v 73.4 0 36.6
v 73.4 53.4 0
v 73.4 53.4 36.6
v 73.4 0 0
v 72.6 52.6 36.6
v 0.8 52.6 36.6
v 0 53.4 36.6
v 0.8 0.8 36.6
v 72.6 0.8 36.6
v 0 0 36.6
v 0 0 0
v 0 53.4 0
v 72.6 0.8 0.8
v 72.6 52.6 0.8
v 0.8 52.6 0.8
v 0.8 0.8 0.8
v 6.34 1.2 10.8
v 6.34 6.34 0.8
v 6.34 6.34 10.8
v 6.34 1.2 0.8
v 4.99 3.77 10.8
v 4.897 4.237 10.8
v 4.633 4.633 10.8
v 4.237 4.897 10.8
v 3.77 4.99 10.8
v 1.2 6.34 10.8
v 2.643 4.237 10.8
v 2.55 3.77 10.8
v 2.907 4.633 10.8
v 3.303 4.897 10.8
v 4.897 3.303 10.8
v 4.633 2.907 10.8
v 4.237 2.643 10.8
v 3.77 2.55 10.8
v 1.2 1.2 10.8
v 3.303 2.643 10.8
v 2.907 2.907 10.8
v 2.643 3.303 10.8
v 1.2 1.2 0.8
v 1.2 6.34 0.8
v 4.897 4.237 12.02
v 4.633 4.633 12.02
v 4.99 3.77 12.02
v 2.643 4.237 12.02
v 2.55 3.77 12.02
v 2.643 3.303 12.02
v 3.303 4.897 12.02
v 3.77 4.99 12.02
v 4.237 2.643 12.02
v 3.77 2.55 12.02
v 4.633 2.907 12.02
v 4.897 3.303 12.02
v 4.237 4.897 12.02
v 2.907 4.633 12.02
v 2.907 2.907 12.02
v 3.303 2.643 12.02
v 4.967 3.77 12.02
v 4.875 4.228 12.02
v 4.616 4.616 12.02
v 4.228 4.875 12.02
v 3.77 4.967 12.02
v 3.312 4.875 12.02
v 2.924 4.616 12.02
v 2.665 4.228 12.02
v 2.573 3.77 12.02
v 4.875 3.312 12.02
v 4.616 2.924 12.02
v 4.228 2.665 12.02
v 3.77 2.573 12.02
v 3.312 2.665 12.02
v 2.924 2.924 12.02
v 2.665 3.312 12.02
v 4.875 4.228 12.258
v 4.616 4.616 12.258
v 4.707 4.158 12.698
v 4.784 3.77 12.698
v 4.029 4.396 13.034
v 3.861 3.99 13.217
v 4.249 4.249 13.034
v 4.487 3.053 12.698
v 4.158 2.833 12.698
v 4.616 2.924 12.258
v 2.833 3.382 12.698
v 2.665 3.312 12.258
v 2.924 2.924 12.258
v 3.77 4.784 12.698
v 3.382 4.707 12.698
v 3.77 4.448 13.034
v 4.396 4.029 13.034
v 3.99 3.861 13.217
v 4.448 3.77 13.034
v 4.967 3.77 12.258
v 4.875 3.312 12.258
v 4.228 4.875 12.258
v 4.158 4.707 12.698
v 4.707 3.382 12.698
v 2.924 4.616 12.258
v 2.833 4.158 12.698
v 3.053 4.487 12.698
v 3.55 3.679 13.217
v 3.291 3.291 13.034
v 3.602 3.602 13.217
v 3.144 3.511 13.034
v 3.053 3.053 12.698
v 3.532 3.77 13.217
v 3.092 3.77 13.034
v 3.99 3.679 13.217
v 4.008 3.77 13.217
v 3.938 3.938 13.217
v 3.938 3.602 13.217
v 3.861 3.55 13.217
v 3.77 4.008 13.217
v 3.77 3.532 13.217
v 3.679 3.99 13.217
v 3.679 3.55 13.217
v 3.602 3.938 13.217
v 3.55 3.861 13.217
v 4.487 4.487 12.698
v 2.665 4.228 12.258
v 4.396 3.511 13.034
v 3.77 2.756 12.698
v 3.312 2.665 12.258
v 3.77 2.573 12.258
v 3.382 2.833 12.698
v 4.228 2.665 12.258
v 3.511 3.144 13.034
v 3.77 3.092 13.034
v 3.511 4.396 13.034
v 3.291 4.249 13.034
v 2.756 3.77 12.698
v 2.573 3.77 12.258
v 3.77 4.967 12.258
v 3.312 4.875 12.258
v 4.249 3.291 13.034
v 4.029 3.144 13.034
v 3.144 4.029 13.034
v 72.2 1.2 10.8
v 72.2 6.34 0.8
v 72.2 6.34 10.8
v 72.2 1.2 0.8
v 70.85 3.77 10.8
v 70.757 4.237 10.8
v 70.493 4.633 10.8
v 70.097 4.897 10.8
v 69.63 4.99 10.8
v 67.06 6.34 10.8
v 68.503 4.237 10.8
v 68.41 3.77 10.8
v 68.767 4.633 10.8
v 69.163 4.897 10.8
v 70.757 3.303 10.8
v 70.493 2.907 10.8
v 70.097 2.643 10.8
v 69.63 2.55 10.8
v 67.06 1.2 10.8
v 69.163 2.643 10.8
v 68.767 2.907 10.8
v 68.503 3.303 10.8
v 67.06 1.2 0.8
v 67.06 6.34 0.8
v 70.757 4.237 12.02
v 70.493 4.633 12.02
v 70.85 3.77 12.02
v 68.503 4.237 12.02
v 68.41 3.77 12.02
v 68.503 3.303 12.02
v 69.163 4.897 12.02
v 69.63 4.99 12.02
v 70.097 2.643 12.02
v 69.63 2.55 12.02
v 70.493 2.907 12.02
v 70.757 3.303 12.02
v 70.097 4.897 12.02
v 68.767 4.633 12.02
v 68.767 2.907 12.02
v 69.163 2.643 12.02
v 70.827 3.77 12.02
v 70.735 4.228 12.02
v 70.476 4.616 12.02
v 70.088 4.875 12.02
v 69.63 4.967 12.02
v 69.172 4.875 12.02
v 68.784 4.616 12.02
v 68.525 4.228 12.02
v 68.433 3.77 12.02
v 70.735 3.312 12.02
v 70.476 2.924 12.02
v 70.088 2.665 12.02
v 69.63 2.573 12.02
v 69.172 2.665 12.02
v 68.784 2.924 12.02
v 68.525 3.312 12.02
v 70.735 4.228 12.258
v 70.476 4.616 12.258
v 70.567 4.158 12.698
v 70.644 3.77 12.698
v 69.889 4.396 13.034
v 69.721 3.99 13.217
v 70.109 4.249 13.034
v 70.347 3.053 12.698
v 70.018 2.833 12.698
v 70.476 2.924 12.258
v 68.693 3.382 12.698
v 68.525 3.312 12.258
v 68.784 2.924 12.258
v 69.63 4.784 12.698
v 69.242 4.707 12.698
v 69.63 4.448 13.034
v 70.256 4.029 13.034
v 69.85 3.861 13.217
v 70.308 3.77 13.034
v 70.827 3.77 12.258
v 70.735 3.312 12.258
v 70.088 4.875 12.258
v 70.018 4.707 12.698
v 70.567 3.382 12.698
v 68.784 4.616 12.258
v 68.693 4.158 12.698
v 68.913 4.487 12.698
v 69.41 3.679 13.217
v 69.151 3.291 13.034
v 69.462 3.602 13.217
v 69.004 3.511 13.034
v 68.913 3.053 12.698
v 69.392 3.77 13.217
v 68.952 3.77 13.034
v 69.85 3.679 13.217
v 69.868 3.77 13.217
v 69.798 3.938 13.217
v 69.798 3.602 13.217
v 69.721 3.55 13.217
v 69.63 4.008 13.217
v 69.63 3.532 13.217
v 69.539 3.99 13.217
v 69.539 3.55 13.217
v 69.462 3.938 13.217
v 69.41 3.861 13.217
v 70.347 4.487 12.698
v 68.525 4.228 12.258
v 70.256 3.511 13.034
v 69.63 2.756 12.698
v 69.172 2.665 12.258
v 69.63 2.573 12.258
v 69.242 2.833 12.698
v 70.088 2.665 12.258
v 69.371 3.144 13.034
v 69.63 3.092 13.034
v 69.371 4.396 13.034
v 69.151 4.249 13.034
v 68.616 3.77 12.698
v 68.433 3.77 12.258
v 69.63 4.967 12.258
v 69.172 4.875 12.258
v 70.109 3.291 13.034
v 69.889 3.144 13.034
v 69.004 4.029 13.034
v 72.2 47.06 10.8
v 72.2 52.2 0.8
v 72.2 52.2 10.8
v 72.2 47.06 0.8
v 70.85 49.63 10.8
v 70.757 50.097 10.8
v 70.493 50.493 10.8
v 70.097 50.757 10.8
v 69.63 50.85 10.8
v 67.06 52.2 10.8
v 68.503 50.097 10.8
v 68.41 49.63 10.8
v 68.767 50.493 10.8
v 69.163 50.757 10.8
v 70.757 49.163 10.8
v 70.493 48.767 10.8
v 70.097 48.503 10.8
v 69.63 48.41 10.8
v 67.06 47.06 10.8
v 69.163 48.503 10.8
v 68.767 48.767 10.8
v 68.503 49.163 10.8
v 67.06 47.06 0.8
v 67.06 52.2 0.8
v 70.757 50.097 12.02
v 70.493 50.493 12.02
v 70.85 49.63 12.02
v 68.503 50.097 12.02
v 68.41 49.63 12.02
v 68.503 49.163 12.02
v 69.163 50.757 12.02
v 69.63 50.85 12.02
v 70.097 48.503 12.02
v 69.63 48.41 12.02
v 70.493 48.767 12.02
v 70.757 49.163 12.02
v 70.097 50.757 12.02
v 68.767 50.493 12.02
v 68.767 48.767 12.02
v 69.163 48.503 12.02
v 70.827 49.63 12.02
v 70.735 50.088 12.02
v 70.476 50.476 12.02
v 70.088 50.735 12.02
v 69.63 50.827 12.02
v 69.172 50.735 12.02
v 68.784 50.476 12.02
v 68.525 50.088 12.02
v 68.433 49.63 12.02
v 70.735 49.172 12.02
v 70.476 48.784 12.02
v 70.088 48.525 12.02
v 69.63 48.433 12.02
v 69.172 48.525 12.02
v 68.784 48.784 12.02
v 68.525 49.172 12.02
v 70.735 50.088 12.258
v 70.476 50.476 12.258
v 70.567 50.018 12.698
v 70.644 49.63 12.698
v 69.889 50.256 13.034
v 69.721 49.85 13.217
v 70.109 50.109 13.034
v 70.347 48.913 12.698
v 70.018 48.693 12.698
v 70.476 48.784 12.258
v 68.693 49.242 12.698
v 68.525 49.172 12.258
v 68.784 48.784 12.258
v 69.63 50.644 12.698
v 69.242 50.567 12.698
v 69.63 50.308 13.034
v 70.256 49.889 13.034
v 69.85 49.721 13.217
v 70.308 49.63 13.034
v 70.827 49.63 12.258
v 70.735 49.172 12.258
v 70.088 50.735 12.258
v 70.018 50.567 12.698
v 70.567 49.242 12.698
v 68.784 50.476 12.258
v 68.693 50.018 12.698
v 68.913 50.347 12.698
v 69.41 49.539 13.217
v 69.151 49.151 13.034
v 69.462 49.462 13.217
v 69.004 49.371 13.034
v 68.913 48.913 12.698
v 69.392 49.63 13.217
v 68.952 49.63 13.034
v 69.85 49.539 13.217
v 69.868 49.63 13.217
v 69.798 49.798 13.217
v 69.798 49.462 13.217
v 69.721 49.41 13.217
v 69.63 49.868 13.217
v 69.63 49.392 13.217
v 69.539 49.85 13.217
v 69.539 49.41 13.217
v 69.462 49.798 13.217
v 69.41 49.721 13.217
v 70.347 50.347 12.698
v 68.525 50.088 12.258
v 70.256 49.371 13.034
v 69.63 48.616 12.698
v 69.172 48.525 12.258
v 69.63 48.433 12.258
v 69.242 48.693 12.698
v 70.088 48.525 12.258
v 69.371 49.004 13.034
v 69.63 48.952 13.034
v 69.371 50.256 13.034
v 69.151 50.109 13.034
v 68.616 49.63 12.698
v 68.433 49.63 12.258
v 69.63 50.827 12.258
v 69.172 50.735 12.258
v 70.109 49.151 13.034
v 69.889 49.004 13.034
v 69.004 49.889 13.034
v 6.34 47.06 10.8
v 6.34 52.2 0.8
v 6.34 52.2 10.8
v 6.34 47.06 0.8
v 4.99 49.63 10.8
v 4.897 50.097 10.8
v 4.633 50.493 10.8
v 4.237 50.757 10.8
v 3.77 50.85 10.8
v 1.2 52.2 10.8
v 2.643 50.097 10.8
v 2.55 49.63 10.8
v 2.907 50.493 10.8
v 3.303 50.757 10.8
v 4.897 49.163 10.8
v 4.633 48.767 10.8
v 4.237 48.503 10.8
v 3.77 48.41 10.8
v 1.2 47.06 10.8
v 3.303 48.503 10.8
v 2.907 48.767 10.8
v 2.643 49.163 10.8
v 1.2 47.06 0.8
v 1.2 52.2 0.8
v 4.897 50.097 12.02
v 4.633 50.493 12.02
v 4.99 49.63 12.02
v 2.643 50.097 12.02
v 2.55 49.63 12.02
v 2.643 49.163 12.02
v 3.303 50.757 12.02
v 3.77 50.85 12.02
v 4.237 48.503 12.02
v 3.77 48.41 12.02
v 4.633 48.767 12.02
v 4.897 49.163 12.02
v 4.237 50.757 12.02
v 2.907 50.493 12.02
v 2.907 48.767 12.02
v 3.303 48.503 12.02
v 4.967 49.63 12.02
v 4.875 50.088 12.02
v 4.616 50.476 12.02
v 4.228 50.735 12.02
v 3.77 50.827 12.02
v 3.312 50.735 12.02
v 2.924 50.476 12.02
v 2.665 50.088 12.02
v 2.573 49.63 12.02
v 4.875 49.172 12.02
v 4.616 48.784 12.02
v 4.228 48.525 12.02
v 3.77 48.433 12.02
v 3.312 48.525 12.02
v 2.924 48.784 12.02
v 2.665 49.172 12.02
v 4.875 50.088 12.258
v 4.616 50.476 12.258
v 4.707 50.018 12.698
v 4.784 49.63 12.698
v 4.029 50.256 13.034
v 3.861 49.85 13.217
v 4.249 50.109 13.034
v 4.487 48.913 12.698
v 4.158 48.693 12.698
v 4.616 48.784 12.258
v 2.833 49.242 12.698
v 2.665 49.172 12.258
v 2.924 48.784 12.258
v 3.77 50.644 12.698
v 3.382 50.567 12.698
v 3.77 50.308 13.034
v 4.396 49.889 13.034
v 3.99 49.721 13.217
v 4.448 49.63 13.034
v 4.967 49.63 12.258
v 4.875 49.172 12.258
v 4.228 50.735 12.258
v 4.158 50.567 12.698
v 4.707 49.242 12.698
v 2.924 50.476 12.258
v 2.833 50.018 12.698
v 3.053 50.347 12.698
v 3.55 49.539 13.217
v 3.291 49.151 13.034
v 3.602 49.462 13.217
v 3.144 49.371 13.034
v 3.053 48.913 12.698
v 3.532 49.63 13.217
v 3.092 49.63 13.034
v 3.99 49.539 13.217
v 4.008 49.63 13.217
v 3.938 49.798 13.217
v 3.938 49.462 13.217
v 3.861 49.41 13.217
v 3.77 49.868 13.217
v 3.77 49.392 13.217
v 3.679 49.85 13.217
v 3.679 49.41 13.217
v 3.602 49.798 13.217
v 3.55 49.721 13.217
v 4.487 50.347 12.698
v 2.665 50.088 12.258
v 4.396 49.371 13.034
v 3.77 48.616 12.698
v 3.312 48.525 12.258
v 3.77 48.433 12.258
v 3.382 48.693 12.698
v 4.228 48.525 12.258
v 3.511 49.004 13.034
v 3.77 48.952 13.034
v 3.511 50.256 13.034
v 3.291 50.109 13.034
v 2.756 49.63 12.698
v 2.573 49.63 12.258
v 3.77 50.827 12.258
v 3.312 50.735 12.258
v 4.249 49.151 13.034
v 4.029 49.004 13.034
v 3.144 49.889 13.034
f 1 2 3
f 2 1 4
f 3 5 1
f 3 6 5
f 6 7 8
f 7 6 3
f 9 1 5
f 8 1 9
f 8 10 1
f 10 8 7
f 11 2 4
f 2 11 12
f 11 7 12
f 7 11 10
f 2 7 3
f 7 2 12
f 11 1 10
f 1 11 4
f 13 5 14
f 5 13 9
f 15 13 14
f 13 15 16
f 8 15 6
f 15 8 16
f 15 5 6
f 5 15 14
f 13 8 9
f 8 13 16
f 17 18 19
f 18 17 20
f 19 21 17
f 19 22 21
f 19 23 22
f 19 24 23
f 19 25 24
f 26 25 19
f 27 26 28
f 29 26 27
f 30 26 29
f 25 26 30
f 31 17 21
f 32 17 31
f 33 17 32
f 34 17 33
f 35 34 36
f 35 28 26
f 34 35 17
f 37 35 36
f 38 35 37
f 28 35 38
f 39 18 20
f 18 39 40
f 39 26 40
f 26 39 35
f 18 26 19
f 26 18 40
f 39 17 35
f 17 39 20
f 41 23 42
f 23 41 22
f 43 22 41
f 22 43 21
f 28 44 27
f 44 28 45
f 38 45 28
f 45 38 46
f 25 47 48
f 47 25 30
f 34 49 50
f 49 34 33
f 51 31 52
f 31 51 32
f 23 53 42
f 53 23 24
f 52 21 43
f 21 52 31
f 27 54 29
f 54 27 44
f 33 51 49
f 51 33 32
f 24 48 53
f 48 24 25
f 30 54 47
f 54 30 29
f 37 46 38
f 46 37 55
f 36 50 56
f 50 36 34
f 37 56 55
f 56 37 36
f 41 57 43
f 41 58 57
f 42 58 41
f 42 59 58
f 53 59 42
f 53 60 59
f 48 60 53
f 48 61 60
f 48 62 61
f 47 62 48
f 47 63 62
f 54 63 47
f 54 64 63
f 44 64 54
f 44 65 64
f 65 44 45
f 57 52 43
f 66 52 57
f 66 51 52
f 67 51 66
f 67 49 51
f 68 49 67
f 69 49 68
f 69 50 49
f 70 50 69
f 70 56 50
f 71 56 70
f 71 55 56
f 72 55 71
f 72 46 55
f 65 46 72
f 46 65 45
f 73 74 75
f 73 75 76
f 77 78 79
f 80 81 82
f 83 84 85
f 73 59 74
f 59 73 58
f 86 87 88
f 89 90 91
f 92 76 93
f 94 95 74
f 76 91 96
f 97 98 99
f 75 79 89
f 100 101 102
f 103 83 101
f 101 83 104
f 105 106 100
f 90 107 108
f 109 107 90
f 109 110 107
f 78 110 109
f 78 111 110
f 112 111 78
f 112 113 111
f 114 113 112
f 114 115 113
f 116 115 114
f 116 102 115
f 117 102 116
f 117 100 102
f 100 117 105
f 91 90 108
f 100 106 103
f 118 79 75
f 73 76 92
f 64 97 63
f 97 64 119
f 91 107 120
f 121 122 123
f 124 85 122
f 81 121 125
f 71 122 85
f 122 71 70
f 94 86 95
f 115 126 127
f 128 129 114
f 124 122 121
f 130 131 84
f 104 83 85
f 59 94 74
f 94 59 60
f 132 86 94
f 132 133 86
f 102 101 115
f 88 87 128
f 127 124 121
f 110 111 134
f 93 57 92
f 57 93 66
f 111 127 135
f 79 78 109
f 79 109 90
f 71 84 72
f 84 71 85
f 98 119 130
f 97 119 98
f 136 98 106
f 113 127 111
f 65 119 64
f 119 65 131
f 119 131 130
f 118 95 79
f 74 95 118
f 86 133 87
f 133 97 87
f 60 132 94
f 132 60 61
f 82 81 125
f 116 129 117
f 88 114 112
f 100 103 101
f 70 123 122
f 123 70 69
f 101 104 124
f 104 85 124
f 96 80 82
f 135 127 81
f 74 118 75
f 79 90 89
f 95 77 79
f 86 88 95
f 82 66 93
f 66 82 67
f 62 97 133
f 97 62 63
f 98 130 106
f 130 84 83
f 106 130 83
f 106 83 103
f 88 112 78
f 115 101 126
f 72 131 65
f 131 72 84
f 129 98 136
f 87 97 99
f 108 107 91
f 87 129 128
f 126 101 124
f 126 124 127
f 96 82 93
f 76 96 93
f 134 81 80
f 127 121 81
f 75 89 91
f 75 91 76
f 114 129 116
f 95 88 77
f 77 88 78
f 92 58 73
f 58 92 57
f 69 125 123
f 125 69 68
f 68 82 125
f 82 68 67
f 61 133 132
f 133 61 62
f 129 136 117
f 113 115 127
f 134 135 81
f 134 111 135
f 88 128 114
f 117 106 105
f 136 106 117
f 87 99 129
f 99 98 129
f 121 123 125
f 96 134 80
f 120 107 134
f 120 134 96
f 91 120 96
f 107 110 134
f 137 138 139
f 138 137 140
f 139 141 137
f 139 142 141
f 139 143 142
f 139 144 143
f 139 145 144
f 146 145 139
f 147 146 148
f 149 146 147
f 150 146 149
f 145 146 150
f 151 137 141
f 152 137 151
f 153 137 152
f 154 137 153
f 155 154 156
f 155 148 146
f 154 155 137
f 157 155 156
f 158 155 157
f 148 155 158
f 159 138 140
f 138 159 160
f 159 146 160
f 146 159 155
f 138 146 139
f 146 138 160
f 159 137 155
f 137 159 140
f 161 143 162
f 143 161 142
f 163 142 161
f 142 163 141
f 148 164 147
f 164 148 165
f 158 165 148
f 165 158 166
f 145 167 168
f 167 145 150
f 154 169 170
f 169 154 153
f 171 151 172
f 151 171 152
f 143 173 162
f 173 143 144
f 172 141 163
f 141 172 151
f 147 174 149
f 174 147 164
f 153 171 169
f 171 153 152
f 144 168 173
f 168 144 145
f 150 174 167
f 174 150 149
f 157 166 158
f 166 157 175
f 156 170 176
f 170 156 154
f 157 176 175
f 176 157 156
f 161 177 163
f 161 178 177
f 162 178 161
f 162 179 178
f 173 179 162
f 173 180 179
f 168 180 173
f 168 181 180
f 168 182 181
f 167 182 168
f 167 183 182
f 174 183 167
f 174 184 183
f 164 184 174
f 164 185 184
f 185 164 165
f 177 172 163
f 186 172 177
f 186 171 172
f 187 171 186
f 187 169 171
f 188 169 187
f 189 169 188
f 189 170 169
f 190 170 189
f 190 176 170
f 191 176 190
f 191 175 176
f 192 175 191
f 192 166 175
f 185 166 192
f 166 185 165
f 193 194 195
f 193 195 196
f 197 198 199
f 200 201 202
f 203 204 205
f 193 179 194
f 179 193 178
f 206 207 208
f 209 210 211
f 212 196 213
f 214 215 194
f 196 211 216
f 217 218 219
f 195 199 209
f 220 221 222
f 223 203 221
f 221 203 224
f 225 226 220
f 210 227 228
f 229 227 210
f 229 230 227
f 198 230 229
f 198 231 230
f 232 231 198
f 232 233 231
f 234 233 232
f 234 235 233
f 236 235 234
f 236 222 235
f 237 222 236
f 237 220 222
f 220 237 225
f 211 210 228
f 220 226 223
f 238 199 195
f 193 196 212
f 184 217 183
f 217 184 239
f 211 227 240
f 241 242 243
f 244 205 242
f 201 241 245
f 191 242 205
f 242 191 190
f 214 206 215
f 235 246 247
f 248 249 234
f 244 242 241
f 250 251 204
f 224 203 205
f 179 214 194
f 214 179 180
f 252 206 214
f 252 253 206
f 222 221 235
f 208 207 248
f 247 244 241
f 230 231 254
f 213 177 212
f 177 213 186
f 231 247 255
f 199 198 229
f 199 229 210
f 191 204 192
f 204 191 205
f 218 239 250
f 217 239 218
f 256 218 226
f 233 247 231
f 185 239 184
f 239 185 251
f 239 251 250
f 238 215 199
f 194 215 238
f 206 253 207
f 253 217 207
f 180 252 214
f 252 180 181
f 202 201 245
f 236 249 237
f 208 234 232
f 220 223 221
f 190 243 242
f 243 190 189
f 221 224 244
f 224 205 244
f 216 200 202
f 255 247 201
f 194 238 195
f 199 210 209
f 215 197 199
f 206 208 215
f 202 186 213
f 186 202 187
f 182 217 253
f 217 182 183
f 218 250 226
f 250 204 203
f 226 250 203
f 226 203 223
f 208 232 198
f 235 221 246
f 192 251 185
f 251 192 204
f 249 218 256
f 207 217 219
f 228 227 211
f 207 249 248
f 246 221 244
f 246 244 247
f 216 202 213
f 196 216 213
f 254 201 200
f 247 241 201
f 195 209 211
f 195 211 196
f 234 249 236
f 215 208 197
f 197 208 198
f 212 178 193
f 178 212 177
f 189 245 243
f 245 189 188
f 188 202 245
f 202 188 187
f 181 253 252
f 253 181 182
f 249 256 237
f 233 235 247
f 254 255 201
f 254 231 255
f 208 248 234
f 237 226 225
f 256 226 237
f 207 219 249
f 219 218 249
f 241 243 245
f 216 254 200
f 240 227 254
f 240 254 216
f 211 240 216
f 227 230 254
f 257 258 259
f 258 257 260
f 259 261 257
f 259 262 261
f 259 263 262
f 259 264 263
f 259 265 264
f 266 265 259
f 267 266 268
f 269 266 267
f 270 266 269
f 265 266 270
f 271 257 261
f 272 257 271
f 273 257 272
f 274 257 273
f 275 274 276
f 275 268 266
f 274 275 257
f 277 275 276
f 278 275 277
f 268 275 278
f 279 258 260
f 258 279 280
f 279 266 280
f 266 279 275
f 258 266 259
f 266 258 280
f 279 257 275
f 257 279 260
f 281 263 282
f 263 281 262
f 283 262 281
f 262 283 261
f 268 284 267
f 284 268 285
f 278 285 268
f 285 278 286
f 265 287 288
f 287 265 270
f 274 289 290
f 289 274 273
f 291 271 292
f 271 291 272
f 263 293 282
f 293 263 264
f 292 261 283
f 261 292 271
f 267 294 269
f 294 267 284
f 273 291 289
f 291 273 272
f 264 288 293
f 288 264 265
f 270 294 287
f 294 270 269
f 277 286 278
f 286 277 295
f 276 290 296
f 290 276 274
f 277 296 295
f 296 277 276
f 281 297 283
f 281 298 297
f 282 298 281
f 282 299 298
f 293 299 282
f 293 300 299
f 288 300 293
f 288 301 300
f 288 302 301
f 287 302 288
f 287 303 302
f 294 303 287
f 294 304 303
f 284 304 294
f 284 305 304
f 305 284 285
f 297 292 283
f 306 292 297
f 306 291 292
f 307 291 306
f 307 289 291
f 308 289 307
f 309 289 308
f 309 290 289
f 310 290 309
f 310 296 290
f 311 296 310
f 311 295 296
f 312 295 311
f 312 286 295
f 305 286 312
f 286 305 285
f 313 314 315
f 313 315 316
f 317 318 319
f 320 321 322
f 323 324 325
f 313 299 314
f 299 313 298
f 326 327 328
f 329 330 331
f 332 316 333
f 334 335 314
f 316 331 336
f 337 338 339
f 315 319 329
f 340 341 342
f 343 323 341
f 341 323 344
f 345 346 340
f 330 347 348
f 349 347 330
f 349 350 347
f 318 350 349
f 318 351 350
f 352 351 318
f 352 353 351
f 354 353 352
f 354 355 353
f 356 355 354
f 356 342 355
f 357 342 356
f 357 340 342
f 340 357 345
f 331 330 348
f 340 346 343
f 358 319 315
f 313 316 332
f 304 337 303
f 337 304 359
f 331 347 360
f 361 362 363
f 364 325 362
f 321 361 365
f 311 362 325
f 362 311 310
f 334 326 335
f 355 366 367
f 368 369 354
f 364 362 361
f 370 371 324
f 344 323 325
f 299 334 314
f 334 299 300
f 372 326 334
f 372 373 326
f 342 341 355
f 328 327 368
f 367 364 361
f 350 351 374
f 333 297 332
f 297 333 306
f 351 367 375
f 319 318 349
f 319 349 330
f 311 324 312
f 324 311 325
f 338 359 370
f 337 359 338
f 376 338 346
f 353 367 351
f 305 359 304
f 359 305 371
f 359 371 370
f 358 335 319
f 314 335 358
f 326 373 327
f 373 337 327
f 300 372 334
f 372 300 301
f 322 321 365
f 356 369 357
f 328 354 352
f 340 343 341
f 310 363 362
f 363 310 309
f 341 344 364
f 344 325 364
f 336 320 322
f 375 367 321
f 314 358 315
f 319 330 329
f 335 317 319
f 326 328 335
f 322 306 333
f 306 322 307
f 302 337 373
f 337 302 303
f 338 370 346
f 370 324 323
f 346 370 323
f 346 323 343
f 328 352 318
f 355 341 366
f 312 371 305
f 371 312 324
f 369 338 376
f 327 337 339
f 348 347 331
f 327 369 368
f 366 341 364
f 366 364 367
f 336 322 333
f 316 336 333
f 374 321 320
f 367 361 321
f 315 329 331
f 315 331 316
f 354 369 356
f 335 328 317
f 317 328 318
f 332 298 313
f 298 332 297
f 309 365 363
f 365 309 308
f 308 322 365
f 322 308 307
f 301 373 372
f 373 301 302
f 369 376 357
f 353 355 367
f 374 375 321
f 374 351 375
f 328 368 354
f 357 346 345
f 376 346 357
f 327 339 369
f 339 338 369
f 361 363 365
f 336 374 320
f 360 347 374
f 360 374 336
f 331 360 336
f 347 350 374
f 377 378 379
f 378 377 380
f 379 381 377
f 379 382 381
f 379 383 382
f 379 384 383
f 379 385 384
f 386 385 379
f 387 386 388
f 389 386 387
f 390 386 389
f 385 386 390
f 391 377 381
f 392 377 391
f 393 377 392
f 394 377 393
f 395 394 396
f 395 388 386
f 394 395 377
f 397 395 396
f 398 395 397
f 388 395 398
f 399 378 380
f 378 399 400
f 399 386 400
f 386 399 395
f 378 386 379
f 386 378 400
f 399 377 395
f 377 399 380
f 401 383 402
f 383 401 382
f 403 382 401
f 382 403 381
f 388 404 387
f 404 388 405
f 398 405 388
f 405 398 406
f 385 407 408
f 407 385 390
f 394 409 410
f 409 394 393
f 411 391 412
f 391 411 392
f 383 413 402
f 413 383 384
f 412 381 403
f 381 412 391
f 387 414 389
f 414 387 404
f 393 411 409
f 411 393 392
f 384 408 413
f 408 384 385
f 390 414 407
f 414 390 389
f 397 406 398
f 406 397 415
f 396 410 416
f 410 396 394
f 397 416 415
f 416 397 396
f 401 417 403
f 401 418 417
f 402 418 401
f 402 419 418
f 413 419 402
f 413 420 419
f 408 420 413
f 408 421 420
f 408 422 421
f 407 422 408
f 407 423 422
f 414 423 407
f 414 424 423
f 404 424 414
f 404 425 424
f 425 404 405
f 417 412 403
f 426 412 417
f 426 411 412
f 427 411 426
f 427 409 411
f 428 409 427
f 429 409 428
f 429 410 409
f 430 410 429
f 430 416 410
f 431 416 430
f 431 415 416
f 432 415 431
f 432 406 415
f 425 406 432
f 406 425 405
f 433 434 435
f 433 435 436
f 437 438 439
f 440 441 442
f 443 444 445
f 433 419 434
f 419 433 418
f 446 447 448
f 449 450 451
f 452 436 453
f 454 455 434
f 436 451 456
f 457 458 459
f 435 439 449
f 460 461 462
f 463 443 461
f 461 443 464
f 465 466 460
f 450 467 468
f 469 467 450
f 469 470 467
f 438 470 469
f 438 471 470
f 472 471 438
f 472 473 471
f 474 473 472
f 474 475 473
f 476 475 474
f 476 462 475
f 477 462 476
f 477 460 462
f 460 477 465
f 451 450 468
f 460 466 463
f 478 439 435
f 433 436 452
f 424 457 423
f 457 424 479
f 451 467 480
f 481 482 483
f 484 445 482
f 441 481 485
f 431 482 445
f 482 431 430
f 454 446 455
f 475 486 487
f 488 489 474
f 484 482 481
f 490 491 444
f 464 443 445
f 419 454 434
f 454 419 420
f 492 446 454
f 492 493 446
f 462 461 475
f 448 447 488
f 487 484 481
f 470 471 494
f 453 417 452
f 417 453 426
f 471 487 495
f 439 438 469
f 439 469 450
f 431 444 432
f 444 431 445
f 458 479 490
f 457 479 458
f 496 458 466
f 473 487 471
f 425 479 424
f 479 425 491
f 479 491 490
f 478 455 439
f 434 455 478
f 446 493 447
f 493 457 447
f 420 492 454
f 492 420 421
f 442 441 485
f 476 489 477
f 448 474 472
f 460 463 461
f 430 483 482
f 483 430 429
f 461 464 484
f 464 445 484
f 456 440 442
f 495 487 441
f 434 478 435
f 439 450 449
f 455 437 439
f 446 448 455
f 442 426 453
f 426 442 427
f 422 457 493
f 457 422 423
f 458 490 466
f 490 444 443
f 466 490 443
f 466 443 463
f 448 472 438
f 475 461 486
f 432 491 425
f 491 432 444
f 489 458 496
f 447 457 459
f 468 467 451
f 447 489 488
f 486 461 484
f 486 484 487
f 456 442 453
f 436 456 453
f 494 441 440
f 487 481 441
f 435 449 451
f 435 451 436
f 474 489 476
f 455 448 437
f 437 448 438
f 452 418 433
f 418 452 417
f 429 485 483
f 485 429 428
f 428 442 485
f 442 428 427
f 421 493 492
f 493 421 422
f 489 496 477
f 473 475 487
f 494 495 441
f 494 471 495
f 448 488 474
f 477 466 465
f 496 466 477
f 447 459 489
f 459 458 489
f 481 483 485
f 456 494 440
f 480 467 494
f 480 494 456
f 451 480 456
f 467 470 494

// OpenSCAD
echo(version=version());

// Values are in millimeters

$fs=0.5;
////////////////////////////

// want something game controller-ish (eventually)

extruder_width = 0.4;
wall_thickness = 2*extruder_width;

battery_thickness = 6 + 4; // +3 for the pins poking outthe bottom of the circuit board.

// How much gap to have between the circuit board and the wall
twTolerence = [extruder_width, extruder_width, 0] * 2; // *2 for both sides

// Size to hold the tri-wing plus JoyWings (the cube that the circuit board fills)
// Top of case should be right inside joysitck tops
triWing = [71, 51, 25 + battery_thickness];

twPegRadius = 1.22;
twEdgeToPegCenter = 2.57;
// The locations of the outter four peg holes (on centers)
twPegs = [
  [twEdgeToPegCenter, twEdgeToPegCenter, 0],
  [triWing[0]-twEdgeToPegCenter, twEdgeToPegCenter, 0],
  [triWing[0]-twEdgeToPegCenter, triWing[1]-twEdgeToPegCenter, 0],
  [twEdgeToPegCenter, triWing[1]-twEdgeToPegCenter, 0],
];

// Need a box to hold the tri-wing with stuff on top.
// Need a top that has openings/buttons in the correct places.
// Need space in bottom for LiPo.

module peg(h1=5, r1=1.22, r2=2.57) {
  h2=r1*2;
  translate([-r2,-r2,0]) cube([r2*2, r2*2, h1]);
  cylinder(r=r1,h=h1+h2/2);
  translate([0, 0, h1+h2/2]) sphere(r=r1);
}

module case() {
  difference() {
    cube(triWing + [2*wall_thickness,2*wall_thickness,2*wall_thickness] + twTolerence);
    // Inside:
    translate([wall_thickness,wall_thickness,wall_thickness]) {
      cube(triWing + [0,0,3] + twTolerence);
    }
  }
  translate([wall_thickness,wall_thickness,0] + twTolerence/2) {
    for (l = twPegs) {
      translate(l + [0,0,wall_thickness])
        peg(h1=battery_thickness, r1=twPegRadius, r2=twEdgeToPegCenter);
    }
  }
  // Now add support pegs to hold board above battery
}

// A flat plate with the four pegs so we can test alignment.
module plate_test() {
  //cube([triWing[0],triWing[1],wall_thickness]);
  for (l = twPegs) {
    translate(l + [0,0,wall_thickness])
      peg(h1=battery_thickness, r1=twPegRadius, r2=twEdgeToPegCenter);
  }
}


case();
//plate_test();
//peg();


// vim: set ai et sw=2 ts=2 :
